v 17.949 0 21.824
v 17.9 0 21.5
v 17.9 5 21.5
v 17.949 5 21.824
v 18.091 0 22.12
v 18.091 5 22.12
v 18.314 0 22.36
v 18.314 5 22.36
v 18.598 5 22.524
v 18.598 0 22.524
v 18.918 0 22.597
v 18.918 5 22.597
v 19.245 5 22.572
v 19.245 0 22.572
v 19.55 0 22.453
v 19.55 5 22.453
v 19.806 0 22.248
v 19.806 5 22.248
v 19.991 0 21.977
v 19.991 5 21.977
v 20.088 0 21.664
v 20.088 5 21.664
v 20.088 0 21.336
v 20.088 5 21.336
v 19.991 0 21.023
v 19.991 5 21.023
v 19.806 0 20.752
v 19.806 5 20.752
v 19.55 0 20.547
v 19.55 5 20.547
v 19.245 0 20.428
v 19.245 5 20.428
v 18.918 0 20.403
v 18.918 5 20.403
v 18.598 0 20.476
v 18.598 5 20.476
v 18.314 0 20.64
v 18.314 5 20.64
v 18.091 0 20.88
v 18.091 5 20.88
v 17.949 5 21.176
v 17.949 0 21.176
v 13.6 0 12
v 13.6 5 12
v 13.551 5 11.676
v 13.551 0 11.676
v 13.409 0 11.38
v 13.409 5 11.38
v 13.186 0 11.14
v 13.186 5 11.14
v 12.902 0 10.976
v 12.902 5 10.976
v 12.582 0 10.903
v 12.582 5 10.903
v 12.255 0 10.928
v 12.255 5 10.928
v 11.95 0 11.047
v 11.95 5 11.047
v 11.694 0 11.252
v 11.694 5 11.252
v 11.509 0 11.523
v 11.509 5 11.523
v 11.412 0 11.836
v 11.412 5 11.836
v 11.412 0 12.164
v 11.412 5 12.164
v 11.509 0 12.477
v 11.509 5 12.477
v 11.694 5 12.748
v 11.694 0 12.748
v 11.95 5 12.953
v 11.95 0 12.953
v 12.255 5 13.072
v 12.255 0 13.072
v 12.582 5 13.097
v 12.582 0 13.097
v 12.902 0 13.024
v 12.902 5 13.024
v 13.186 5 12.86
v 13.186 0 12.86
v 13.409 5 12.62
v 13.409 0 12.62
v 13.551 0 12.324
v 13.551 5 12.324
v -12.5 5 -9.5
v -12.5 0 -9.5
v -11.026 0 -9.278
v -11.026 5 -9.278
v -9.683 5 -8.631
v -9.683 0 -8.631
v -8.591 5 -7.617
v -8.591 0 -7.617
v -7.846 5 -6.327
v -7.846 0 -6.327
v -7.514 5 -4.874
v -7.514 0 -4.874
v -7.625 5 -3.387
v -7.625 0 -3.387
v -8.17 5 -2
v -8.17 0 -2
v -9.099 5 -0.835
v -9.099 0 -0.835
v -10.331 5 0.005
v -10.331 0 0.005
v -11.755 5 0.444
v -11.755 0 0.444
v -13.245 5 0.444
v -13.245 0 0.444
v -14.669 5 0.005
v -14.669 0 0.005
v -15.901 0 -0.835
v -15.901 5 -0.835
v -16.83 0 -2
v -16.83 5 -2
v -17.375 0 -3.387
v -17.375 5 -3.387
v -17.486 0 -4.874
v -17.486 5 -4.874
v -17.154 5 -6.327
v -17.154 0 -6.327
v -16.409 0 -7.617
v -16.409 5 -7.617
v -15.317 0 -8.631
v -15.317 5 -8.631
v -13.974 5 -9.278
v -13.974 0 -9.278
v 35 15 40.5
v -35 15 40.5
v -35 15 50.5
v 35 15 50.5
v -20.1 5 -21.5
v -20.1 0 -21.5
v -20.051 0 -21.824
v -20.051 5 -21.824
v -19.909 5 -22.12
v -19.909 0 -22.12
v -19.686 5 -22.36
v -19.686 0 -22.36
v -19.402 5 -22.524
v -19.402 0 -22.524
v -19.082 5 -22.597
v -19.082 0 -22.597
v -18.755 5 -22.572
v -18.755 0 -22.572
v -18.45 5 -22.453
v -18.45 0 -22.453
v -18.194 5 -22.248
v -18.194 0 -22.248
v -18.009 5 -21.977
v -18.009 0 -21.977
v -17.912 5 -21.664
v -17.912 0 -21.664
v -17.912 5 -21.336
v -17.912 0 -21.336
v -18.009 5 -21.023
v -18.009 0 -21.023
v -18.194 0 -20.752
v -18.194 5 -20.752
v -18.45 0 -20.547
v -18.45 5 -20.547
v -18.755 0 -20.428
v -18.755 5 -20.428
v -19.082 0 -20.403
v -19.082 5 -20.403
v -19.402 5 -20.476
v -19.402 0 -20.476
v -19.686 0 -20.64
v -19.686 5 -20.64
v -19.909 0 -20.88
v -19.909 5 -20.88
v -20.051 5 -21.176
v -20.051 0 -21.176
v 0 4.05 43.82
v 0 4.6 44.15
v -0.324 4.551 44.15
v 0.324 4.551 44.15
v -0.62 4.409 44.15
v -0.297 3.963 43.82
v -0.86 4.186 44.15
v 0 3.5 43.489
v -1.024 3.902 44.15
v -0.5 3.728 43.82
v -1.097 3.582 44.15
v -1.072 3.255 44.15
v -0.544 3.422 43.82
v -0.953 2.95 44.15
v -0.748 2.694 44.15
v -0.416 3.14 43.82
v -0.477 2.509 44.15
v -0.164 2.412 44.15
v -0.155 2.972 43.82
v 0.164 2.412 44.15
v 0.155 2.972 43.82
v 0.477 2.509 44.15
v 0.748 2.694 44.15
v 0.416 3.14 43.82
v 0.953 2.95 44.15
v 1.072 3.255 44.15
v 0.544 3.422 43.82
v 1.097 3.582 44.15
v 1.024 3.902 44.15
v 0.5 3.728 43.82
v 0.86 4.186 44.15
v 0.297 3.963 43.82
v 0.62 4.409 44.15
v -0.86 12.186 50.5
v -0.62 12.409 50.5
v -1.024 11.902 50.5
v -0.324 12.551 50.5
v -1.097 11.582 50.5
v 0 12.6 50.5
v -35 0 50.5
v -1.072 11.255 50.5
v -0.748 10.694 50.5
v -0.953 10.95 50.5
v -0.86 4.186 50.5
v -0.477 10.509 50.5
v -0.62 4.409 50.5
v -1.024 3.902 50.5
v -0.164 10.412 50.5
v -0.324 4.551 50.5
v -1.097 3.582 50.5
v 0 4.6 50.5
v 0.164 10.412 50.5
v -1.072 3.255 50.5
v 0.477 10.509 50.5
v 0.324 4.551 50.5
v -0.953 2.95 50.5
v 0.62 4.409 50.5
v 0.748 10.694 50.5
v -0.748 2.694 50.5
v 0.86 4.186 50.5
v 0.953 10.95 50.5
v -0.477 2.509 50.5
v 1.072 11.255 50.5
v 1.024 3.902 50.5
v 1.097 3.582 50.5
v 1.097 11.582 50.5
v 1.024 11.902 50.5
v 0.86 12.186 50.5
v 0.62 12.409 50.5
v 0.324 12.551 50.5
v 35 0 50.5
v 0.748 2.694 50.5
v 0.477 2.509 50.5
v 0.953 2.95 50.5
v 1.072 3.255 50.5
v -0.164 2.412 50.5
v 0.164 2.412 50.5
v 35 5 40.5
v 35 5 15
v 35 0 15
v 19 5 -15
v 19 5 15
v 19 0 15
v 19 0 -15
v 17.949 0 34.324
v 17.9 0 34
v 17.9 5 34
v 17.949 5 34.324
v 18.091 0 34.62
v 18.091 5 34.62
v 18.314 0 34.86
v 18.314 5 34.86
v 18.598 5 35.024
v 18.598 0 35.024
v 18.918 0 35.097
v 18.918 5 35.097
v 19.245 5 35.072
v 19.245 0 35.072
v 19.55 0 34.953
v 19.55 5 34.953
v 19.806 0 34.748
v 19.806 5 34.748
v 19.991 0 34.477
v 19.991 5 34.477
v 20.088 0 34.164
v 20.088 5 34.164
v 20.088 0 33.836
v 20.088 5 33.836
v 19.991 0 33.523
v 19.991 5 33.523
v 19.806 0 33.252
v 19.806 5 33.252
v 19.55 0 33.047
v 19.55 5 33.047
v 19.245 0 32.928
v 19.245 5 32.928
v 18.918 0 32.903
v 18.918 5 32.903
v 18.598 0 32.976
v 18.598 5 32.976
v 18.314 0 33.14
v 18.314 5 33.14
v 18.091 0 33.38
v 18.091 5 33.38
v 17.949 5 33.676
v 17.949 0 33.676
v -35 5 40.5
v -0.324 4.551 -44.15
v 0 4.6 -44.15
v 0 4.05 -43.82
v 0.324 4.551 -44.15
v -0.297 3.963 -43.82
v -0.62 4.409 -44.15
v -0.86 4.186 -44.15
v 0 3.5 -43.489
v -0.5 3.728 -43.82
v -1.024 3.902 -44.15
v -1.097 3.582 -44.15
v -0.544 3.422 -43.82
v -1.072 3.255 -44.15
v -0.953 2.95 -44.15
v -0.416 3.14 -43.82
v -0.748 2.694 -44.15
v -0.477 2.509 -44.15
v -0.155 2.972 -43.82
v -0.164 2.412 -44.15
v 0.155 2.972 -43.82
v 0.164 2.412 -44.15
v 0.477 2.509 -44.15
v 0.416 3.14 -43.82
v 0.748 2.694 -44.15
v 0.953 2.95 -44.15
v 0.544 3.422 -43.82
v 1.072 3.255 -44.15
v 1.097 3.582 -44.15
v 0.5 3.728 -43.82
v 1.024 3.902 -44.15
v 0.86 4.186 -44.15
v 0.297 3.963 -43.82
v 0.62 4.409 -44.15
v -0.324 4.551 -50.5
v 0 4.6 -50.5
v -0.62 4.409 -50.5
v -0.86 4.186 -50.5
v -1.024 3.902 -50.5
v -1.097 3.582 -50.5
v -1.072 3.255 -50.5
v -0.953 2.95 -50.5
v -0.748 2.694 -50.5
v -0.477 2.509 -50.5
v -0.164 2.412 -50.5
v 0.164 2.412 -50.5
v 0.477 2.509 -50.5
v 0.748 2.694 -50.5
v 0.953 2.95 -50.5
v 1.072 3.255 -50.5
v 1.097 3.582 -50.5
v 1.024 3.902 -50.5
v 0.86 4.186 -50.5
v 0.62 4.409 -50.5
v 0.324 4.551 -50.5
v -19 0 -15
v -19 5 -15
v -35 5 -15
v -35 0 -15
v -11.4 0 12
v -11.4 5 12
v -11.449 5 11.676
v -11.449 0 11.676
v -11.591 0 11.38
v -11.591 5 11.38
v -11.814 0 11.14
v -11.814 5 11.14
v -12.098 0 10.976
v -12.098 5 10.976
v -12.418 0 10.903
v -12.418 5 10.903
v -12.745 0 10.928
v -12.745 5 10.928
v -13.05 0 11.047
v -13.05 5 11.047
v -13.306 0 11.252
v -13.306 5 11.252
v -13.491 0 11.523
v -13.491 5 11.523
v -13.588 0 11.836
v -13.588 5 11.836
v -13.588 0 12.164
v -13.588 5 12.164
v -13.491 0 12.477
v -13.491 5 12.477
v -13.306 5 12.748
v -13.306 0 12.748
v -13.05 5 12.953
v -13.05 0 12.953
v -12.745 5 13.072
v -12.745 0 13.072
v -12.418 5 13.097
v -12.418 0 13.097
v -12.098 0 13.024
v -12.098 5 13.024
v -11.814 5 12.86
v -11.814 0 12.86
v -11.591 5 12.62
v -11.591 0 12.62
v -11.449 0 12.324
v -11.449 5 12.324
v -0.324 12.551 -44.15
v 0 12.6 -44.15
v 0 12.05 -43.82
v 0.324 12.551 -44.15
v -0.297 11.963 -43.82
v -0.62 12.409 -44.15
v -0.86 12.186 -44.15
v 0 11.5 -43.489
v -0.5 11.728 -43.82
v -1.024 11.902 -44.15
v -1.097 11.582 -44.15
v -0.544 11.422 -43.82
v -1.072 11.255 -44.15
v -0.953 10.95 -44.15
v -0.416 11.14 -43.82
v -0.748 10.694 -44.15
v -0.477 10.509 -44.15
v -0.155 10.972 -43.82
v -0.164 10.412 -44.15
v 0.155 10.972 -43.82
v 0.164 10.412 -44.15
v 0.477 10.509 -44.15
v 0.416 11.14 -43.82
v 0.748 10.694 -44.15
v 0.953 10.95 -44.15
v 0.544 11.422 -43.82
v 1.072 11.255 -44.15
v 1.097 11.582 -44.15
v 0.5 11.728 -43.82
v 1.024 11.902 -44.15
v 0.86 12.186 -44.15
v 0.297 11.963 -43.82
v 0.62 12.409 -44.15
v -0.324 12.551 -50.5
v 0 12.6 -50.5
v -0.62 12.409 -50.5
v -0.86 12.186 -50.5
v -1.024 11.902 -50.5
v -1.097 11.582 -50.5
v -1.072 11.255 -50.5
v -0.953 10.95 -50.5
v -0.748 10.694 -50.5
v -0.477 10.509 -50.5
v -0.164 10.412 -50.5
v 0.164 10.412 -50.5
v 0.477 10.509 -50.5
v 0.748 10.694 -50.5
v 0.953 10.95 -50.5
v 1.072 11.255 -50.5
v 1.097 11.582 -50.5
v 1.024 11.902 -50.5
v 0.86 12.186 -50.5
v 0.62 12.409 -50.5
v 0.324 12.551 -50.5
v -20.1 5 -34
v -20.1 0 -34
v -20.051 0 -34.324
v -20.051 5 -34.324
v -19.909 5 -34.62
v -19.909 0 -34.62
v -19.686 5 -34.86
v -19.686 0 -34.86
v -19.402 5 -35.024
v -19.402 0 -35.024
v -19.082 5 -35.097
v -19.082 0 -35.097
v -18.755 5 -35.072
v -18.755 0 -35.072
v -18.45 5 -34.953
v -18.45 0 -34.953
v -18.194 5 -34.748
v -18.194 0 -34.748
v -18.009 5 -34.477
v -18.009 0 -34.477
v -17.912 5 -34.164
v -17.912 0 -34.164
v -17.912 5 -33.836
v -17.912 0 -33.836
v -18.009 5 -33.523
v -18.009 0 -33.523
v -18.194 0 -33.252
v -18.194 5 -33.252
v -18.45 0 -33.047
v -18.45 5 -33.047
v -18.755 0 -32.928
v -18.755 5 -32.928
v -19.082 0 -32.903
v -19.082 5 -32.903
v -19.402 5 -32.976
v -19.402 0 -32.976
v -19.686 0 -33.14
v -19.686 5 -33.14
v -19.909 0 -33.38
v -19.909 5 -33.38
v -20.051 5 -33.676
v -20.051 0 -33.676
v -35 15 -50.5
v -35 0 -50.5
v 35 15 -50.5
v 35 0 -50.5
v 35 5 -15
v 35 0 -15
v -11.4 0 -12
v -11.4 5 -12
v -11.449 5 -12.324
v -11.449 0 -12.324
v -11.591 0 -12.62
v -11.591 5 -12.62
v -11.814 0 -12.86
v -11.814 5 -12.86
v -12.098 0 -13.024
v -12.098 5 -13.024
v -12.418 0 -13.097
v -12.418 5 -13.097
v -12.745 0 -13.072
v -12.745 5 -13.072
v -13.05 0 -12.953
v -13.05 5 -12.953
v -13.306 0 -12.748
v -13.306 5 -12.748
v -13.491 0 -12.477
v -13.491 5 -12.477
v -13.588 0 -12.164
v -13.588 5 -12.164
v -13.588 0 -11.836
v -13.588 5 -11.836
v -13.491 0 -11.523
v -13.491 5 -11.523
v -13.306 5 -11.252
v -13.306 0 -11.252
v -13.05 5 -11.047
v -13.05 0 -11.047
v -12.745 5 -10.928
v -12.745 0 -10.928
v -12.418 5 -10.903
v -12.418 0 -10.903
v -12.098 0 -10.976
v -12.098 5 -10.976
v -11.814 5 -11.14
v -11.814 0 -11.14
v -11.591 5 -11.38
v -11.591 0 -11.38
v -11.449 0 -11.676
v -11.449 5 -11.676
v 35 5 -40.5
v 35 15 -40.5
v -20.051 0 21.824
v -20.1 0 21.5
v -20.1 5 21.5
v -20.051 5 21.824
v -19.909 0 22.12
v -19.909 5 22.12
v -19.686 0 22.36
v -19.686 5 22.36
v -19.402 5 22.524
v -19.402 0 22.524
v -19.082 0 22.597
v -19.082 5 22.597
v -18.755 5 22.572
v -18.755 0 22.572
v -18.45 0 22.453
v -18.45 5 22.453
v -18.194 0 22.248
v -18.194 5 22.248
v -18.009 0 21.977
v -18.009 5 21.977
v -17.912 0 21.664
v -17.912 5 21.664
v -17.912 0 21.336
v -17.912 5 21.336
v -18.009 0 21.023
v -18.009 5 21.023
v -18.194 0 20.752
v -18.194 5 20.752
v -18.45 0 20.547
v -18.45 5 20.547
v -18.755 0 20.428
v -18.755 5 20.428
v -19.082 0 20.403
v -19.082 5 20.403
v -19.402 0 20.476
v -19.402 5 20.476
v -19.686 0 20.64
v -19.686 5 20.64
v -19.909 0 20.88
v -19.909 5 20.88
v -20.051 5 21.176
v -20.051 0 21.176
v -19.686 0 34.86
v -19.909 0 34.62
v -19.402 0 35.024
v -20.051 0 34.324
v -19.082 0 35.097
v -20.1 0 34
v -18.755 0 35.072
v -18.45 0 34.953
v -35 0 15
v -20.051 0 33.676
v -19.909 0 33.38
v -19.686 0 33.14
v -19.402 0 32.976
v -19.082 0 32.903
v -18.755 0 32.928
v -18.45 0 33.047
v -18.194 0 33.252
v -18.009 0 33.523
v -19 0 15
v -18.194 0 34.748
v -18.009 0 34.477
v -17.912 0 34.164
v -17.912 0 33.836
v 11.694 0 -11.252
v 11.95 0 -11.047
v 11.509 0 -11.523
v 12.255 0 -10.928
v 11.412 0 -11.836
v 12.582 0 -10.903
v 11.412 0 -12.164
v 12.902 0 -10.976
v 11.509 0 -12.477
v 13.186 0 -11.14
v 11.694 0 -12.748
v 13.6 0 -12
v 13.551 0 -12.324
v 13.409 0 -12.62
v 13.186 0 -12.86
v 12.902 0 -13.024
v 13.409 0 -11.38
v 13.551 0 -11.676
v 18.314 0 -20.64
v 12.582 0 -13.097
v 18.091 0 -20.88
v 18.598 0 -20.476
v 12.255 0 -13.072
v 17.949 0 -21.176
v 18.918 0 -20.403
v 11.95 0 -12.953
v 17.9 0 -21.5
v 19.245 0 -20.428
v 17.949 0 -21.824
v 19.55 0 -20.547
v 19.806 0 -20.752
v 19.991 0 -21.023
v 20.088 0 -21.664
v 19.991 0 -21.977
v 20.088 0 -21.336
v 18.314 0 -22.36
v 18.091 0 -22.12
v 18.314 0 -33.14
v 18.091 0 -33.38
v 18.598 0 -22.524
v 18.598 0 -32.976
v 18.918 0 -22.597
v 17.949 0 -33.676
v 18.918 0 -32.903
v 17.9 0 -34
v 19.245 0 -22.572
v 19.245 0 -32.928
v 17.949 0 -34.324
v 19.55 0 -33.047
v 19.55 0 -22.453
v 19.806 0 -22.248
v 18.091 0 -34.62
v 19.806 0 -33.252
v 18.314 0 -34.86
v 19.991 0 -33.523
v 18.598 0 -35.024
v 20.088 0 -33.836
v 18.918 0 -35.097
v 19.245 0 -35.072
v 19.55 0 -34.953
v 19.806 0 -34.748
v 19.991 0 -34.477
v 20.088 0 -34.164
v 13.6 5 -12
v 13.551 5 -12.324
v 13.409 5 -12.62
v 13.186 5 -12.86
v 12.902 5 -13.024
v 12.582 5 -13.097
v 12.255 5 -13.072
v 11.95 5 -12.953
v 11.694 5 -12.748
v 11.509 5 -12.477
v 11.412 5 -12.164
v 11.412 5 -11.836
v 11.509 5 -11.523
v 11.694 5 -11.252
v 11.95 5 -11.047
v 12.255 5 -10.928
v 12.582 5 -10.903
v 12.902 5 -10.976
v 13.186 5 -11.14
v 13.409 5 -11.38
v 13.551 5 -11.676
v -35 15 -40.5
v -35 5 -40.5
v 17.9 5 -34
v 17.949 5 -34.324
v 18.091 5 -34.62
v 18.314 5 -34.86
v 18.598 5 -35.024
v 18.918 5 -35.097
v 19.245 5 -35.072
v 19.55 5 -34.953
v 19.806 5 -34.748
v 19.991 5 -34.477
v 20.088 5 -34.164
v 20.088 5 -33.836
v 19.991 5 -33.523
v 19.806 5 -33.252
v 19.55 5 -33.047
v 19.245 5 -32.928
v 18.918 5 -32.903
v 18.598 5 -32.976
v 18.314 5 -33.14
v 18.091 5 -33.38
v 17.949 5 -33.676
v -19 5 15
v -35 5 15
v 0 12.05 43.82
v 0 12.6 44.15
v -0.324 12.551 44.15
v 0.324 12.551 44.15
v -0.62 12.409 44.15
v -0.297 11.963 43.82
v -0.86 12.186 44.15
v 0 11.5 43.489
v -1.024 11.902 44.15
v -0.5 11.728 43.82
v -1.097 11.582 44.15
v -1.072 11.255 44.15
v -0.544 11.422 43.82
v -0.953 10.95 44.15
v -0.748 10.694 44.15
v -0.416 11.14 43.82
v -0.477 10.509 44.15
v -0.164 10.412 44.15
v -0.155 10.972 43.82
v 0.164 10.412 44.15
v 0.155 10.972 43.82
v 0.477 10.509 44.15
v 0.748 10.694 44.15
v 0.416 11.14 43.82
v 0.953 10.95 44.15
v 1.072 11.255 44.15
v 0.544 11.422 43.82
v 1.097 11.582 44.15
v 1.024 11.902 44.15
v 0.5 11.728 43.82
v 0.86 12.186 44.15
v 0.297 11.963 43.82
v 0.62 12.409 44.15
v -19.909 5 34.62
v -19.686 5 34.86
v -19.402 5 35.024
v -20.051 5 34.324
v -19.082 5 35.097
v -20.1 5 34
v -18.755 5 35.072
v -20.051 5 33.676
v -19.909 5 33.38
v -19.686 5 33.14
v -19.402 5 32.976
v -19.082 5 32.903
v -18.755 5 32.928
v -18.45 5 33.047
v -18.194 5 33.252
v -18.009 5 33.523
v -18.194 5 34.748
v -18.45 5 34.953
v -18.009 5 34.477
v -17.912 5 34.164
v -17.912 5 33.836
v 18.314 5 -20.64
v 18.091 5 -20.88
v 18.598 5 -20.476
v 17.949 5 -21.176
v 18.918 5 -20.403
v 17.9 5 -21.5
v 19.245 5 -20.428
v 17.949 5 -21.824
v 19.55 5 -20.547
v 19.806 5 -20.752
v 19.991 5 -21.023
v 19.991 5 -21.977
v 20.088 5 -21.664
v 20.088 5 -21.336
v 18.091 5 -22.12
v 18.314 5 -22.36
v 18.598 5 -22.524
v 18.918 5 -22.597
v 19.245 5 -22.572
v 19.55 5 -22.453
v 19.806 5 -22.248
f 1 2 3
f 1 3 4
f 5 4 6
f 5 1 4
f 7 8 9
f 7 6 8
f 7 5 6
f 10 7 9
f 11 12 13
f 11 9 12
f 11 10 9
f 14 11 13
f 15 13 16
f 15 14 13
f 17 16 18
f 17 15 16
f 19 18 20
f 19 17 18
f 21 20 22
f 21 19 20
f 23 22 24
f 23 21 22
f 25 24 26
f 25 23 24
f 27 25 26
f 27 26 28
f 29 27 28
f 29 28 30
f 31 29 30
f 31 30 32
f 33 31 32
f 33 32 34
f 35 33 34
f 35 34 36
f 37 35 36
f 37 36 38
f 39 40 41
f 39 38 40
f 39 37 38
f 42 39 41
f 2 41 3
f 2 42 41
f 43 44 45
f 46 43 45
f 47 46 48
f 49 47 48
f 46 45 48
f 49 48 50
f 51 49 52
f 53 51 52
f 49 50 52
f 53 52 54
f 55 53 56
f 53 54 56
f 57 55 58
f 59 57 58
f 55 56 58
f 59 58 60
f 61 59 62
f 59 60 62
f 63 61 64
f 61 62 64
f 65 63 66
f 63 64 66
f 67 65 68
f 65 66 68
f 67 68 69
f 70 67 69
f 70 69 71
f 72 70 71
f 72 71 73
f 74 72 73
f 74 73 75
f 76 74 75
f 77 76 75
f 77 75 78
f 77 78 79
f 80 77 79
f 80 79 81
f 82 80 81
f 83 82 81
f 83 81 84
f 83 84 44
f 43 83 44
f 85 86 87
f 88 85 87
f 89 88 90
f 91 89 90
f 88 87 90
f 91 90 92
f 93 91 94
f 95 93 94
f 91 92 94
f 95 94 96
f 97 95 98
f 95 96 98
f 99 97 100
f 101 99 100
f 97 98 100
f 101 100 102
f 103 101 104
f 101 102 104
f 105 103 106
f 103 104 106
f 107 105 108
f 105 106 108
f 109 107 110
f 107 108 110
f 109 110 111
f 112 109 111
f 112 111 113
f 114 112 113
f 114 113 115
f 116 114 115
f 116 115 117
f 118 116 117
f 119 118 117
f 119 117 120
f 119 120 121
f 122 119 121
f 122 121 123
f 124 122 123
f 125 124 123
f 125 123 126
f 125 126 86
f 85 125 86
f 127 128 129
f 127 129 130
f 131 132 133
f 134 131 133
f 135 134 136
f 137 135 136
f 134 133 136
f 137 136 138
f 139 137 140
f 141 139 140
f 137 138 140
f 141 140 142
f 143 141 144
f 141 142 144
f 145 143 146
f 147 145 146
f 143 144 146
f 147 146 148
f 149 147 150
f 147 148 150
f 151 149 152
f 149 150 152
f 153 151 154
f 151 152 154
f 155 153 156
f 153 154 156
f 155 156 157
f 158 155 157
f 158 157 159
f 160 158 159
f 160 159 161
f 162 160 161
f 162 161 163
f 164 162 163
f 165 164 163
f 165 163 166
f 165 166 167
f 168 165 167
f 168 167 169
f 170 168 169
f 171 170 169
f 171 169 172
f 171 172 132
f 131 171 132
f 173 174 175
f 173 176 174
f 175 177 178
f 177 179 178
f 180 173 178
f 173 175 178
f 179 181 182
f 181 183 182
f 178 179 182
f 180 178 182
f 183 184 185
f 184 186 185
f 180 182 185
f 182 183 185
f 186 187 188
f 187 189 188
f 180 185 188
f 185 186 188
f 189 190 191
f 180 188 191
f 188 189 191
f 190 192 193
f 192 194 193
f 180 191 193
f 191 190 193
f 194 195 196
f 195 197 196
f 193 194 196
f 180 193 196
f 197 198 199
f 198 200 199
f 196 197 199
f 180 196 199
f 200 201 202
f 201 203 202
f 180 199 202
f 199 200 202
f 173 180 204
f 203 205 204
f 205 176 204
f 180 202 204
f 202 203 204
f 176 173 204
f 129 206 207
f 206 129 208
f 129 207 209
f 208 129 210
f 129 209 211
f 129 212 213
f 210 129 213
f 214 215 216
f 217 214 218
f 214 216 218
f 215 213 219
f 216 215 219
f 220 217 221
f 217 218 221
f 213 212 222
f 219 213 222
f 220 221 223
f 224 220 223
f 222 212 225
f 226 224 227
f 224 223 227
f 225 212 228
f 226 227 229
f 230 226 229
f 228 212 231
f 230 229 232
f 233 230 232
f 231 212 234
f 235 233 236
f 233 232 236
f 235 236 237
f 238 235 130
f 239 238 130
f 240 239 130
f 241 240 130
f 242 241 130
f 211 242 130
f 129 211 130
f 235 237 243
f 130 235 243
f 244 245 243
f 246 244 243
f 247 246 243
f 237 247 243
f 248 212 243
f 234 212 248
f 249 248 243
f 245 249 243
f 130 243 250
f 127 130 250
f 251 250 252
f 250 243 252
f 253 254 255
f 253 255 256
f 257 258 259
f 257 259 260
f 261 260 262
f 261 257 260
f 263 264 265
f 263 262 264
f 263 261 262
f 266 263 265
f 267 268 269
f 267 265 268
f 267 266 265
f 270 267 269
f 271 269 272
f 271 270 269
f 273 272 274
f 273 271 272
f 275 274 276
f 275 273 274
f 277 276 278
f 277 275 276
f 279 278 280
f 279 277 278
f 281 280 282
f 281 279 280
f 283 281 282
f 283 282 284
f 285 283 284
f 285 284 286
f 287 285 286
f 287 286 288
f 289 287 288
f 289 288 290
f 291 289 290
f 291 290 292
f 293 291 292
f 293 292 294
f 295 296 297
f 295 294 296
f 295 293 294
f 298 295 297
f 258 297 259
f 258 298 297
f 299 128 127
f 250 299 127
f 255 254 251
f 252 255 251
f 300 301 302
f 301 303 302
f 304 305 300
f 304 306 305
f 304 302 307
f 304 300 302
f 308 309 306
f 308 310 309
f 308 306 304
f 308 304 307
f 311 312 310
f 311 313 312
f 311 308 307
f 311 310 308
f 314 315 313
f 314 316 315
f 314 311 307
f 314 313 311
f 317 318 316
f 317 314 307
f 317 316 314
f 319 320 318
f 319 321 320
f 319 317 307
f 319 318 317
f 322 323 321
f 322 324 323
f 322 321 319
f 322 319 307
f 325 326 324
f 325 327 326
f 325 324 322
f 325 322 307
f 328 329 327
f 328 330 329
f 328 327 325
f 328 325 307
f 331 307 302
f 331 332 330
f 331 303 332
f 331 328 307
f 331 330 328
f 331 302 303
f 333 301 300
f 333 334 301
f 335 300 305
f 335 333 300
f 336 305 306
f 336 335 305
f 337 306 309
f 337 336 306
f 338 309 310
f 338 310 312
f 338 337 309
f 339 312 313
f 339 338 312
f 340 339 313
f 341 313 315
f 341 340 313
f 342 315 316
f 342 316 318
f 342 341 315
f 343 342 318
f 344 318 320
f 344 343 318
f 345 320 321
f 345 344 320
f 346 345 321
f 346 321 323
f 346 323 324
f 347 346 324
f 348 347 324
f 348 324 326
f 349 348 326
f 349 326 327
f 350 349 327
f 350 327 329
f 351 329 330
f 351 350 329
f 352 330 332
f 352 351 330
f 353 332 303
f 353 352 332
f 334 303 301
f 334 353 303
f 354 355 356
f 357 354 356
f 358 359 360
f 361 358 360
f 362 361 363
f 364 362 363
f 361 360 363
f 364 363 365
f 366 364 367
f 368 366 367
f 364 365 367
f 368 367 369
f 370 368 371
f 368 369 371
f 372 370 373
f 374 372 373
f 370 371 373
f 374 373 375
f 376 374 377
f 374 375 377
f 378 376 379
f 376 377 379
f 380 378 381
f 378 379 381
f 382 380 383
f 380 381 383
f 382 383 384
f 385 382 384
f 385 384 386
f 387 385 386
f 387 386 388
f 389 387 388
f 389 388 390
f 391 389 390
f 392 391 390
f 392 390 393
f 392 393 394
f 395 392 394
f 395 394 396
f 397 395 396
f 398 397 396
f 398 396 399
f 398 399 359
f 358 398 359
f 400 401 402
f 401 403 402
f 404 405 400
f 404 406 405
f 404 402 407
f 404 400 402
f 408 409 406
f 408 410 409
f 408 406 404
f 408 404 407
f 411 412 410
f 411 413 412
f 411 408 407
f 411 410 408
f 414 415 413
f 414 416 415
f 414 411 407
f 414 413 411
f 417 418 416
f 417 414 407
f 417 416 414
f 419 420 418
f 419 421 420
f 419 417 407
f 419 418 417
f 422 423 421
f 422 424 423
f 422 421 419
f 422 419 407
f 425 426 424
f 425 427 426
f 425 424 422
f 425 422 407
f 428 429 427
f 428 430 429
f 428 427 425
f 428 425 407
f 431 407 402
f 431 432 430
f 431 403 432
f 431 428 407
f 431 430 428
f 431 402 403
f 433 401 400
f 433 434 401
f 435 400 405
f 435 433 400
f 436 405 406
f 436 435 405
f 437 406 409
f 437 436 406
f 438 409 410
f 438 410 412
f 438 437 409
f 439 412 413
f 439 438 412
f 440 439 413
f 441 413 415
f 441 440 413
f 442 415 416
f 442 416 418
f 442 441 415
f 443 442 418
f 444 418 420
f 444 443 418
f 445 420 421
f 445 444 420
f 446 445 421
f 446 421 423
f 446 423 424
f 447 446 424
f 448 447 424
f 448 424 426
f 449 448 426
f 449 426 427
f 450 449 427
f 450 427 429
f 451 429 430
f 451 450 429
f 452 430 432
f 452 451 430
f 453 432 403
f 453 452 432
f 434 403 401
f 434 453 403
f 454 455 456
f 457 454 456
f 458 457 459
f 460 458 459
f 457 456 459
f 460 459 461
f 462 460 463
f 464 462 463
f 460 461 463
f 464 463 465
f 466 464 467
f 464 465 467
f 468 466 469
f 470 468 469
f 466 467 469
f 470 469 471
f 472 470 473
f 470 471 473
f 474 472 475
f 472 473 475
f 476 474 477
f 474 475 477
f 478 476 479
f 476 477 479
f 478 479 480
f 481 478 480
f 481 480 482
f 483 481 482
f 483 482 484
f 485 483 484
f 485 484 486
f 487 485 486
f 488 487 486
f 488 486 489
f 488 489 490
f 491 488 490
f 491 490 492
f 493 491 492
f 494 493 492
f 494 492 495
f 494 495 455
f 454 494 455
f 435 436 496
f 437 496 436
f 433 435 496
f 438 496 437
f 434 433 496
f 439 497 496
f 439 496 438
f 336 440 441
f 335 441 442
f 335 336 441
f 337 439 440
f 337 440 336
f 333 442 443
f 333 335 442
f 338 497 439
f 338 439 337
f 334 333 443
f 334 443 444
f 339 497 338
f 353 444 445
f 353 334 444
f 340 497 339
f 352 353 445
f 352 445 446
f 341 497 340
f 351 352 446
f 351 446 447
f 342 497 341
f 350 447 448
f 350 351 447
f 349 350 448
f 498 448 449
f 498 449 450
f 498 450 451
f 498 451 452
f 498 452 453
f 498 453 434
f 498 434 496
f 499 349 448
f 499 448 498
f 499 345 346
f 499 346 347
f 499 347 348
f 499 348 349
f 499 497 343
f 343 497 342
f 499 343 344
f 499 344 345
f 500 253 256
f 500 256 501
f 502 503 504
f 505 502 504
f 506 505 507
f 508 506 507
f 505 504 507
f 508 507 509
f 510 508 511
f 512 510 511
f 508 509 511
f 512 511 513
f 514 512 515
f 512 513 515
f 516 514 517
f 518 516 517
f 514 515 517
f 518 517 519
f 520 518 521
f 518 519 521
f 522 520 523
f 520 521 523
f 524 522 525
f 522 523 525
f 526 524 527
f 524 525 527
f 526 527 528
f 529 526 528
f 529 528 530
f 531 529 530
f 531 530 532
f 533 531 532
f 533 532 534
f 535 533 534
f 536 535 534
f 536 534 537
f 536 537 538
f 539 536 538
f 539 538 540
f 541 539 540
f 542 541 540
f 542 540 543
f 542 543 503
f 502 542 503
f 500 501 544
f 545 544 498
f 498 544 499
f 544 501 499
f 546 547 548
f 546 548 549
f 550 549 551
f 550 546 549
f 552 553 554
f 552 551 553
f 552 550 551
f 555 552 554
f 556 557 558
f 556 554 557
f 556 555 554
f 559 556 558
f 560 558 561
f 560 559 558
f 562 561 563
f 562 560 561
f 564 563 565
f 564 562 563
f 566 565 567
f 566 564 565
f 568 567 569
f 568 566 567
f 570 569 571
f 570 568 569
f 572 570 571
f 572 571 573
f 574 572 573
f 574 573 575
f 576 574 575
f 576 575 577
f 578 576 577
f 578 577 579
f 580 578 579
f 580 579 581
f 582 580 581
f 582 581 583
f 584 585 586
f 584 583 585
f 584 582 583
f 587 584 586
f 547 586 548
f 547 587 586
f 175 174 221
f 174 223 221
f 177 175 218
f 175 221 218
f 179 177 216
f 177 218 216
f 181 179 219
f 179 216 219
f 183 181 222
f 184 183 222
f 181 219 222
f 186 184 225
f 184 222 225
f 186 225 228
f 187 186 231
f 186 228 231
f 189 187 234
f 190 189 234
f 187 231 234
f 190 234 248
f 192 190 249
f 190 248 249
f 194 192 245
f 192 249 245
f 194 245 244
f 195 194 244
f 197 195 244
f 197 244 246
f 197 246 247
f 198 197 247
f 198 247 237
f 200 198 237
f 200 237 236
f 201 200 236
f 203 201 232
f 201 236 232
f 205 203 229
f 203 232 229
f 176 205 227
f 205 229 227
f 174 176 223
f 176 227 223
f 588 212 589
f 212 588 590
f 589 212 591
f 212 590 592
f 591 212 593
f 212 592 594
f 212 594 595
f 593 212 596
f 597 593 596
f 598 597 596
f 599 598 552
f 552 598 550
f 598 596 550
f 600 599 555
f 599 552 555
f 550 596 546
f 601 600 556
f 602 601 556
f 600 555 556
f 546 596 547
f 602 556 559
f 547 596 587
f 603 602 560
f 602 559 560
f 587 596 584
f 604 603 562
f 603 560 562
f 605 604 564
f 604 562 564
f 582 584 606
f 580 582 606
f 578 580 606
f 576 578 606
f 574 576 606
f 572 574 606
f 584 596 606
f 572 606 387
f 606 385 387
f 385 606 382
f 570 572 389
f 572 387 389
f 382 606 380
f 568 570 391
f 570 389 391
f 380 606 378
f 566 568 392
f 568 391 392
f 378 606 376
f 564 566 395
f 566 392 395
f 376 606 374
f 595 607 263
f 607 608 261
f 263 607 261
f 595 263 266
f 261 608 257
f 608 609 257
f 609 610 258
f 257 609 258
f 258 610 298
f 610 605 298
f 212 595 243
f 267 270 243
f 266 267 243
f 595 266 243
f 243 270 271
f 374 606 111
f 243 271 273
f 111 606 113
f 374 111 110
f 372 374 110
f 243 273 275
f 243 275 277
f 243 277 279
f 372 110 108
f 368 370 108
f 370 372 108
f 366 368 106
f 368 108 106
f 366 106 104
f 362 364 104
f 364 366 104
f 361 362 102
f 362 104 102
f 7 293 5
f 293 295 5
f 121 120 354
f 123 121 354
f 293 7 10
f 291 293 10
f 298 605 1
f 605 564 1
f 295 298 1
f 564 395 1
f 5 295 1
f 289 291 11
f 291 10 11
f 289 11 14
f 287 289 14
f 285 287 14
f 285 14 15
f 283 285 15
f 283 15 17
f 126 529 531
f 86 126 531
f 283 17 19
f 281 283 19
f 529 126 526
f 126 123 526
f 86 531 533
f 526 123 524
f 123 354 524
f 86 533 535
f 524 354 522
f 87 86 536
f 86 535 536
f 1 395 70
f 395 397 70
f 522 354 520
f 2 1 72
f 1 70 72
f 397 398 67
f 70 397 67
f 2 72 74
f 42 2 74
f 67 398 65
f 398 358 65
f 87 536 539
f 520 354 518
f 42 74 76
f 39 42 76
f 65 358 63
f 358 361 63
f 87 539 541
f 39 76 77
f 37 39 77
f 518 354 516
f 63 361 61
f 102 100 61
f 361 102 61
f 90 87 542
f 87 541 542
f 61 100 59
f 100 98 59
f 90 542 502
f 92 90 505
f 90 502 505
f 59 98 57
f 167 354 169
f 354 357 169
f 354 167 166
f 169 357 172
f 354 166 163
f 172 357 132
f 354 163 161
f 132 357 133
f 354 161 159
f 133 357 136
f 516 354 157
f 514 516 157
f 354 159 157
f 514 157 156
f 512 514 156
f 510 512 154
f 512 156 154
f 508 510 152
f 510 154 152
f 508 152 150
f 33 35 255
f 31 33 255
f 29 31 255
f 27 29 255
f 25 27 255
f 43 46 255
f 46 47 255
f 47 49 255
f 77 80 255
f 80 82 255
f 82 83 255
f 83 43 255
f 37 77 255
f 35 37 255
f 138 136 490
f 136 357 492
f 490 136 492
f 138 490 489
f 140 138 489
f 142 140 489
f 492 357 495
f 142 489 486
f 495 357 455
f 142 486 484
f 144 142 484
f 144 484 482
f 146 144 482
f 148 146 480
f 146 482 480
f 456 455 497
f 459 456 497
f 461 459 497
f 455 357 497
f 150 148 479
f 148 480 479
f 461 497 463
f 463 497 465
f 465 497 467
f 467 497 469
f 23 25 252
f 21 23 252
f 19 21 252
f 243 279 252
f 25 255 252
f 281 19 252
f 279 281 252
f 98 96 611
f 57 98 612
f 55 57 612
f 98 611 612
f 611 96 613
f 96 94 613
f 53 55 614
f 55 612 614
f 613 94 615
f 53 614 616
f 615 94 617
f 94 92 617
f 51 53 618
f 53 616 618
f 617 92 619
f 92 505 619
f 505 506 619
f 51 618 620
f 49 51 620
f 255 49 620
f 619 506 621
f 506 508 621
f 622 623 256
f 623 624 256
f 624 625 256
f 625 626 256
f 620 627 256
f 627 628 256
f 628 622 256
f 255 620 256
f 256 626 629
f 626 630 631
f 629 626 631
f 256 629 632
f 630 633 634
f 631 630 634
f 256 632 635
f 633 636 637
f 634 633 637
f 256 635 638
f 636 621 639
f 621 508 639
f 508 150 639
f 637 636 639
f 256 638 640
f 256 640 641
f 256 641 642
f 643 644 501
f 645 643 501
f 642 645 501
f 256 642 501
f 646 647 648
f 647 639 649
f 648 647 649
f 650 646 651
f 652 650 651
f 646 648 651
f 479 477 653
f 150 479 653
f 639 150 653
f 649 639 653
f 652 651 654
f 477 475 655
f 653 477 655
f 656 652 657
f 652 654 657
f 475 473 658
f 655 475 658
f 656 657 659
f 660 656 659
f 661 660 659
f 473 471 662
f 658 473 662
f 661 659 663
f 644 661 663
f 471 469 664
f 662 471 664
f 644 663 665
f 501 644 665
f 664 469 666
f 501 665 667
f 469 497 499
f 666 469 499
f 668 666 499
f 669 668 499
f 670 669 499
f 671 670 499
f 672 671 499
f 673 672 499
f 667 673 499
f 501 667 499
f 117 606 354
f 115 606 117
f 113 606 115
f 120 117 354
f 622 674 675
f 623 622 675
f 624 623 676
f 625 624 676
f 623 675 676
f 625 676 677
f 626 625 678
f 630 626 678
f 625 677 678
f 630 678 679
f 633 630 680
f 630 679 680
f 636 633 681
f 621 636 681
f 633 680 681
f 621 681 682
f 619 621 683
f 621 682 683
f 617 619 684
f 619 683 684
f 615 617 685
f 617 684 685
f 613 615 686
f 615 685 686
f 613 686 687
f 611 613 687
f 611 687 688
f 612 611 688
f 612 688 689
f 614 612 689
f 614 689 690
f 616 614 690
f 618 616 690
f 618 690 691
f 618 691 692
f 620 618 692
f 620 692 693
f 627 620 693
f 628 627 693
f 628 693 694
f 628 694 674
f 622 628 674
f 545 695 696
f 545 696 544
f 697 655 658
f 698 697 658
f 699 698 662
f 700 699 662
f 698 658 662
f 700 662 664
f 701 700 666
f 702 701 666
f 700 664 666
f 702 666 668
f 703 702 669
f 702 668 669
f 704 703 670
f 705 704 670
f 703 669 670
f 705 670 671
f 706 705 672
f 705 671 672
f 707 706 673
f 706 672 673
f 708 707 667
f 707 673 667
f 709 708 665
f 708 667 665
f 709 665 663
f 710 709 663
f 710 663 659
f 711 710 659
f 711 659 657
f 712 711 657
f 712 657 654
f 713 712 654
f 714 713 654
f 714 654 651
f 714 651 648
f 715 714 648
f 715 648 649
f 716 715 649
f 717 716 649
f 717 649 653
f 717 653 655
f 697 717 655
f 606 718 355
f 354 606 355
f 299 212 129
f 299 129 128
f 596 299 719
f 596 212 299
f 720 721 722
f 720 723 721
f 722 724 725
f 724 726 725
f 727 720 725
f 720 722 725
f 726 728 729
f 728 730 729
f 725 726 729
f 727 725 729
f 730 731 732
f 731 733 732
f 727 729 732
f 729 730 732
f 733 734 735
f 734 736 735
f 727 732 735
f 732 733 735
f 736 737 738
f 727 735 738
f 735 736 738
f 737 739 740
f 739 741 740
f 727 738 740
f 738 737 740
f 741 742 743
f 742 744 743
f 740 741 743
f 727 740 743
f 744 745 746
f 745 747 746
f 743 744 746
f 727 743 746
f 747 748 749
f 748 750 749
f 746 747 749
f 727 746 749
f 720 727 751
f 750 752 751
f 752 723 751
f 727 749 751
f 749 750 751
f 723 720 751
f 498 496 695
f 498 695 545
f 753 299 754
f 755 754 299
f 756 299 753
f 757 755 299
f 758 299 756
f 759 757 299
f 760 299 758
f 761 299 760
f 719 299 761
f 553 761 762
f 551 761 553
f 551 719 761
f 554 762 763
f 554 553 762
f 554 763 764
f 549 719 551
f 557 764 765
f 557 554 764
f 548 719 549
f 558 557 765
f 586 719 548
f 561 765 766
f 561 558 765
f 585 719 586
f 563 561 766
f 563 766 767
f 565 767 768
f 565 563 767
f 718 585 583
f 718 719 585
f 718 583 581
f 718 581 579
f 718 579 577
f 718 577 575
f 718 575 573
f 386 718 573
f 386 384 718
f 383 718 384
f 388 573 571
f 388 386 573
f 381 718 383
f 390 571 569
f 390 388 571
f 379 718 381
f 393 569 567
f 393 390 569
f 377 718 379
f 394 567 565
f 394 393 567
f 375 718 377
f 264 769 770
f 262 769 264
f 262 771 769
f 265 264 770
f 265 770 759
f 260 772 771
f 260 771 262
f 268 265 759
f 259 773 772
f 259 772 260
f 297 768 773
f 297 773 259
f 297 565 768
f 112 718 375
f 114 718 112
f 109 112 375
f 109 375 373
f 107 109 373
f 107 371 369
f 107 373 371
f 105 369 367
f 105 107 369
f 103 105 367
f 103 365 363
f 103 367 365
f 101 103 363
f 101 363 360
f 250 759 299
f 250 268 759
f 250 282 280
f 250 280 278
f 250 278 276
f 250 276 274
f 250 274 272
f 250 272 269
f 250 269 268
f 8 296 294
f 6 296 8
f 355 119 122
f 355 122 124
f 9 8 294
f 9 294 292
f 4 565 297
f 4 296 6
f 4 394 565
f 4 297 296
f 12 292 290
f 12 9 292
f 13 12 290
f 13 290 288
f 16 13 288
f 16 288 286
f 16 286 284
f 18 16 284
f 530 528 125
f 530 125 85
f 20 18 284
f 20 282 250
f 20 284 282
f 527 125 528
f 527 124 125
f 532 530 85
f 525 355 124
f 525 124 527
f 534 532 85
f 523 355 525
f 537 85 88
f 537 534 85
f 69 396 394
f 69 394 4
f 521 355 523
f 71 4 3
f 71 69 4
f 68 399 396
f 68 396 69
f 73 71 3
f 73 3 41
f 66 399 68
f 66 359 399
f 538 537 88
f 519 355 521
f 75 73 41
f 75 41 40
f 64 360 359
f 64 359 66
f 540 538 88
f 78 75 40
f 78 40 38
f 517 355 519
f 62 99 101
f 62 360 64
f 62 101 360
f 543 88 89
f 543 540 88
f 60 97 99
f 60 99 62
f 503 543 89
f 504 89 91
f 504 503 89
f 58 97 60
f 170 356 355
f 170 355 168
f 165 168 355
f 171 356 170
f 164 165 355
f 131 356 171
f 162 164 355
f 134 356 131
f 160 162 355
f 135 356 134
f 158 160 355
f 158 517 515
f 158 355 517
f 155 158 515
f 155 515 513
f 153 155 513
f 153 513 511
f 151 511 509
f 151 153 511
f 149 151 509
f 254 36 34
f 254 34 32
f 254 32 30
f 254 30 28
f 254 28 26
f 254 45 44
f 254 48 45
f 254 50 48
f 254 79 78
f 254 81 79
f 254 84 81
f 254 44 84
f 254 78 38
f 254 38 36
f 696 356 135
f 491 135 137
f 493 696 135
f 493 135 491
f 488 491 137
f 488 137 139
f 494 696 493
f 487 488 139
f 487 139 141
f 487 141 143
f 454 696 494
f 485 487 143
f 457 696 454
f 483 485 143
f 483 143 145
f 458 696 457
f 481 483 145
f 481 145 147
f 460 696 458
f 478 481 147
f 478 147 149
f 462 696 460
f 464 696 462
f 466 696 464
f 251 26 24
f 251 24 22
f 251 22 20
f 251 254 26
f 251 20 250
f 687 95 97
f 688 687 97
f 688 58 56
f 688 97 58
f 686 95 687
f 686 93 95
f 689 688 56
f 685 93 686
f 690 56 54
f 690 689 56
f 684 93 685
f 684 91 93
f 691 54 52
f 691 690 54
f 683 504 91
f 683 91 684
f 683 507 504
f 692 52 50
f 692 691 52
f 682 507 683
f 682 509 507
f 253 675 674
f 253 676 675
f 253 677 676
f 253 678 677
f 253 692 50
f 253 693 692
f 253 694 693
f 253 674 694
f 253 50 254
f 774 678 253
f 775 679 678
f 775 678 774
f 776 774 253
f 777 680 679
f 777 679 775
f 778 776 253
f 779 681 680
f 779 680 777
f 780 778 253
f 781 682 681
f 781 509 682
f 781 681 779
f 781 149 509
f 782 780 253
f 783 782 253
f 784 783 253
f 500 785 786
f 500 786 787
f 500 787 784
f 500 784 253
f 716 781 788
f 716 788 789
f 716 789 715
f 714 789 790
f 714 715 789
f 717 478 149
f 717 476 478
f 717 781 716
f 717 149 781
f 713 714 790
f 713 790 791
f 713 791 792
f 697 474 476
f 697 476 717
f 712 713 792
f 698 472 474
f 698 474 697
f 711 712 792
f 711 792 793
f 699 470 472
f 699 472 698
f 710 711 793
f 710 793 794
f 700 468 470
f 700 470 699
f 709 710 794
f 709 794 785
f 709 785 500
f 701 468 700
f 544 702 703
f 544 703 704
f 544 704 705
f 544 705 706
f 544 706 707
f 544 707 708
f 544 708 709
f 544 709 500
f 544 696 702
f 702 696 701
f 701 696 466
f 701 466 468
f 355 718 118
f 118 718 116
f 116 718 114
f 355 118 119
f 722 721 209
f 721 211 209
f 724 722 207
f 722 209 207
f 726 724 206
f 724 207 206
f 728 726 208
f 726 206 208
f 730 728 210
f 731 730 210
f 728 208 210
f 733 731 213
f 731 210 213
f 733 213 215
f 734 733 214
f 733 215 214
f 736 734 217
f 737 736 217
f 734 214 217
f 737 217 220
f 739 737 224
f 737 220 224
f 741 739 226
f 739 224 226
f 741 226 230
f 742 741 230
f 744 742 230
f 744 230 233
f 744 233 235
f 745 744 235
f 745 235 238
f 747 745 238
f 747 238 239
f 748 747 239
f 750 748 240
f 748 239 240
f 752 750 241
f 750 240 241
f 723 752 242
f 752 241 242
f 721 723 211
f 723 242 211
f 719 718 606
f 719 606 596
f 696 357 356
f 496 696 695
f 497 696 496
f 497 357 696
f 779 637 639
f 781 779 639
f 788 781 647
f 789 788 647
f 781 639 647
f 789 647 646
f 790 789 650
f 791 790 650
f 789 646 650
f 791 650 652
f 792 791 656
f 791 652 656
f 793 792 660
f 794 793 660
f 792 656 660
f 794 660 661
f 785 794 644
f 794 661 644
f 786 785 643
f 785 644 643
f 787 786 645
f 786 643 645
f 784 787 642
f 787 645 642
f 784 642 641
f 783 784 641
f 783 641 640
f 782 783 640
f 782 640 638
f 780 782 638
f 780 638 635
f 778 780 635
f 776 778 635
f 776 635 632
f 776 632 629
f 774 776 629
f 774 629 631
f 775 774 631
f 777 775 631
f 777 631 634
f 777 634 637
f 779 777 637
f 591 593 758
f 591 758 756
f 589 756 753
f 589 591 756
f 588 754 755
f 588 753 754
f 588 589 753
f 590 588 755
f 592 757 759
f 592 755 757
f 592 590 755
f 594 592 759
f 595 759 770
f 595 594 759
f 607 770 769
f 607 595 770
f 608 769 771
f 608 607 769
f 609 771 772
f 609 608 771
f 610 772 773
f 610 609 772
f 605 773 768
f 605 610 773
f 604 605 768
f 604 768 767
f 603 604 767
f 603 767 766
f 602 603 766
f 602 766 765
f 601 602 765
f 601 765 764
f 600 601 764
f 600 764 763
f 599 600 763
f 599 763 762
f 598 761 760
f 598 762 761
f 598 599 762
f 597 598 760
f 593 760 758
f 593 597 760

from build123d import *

# Parameters (mm, degrees)
SKETCH_1_W           = 70
SKETCH_1_H           = 101
EXTRUDE_1_DEPTH      = 15
SKETCH_3_W           = 70
SKETCH_3_H           = 81
CUT_EXTRUDE_2_DEPTH  = 10
F_1_0MM_1_AT_2_COUNT = 2
F_1_0MM_1_AT_2_PITCH = 8
SKETCH_7_W           = 16
SKETCH_7_H           = 30
CUT_EXTRUDE_3_DEPTH  = 63.251506006
F_1_0MM_3_D          = 2.2
SKETCH_11_R          = 5
CUT_EXTRUDE_4_DEPTH  = 64.247529596
F_1_0MM_2_D          = 2.2


with BuildPart() as part:
    # 草圖1 → 填料-伸長1 (new body)
    with BuildSketch(Plane(origin=(0, 0, 0), x_dir=(1, 0, 0), z_dir=(0, 1, 0))):
        Rectangle(SKETCH_1_W, SKETCH_1_H)
    extrude(amount=EXTRUDE_1_DEPTH)

    # 草圖3 → 除料-伸長2 (cut)
    with BuildSketch(Plane(origin=(0, 15, 0), x_dir=(1, 0, 0), z_dir=(0, 1, 0))):
        Rectangle(SKETCH_3_W, SKETCH_3_H)
    extrude(amount=-CUT_EXTRUDE_2_DEPTH, mode=Mode.SUBTRACT)

    # 草圖6 → Ø1.0mm 定位孔1 (revolve, cut)
    with BuildSketch(Plane(origin=(0, 3.5, -50.5), x_dir=(0, 1, 0), z_dir=(1, 0, 0))):
        Polygon((0, 0), (0, 7.010946681), (1.1, 6.35), (1.1, 0), align=None)
    f_1_0mm_1 = revolve(axis=Axis((0, 3.5, -56.85), (0, 0, 1)), mode=Mode.SUBTRACT)

    # Ø1.0mm 定位孔1 at 2: Ø1.0mm 定位孔1 ×2
    with Locations(*[(0, i * F_1_0MM_1_AT_2_PITCH, 0) for i in range(1, F_1_0MM_1_AT_2_COUNT)]):
        add(f_1_0mm_1, mode=Mode.SUBTRACT)

    # 鏡射1: Ø1.0mm 定位孔1 across plane
    add(f_1_0mm_1.mirror(Plane.XY), mode=Mode.SUBTRACT)

    # 鏡射1 copy 1 sketch → 鏡射1 copy 1 (revolve, cut)
    with BuildSketch(Plane(origin=(0, 11.5, 50.5), x_dir=(0, 1, 0), z_dir=(1, 0, 0))):
        Polygon((0, 0), (0, -7.010946681), (1.1, -6.35), (1.1, 0), align=None)
    revolve(axis=Axis((0, 11.5, 56.85), (0, 0, 1)), mode=Mode.SUBTRACT)

    # 草圖7 → 除料-伸長3 (cut, through all)
    with BuildSketch(Plane(origin=(0, 5, 0), x_dir=(1, 0, 0), z_dir=(0, 1, 0))):
        with Locations((27, 0)):
            Rectangle(SKETCH_7_W, SKETCH_7_H)
    cut_extrude_3 = extrude(amount=-CUT_EXTRUDE_3_DEPTH, mode=Mode.SUBTRACT)

    # 鏡射2: 除料-伸長3 across plane
    add(cut_extrude_3.mirror(Plane(origin=(0, 0, 0), x_dir=(0, 0, 1), z_dir=(1, 0, 0))), mode=Mode.SUBTRACT)

    # Ø1.0mm 定位孔3 (through all)
    with Locations(Plane(origin=(0, 0, 0), x_dir=(-1, 0, 0), z_dir=(0, -1, 0))):
        with Locations((-12.5, -12), (12.5, -12), (-12.5, 12), (12.5, 12)):
            Hole(F_1_0MM_3_D / 2)

    # 草圖11 → 除料-伸長4 (cut, through all)
    with BuildSketch(Plane.XZ):
        with Locations(Location((-12.5, -4.5, 0), (0, 0, 270))):
            Circle(SKETCH_11_R)
    extrude(amount=-CUT_EXTRUDE_4_DEPTH, mode=Mode.SUBTRACT)

    # Ø1.0mm 定位孔2 (through all)
    with Locations(Plane(origin=(0, 5, 0), x_dir=(1, 0, 0), z_dir=(0, 1, 0))):
        with Locations((-19, 34), (-19, 21.5), (19, 21.5), (19, 34)):
            f_1_0mm_2 = Hole(F_1_0MM_2_D / 2)

    # 鏡射3: Ø1.0mm 定位孔2 across plane
    add(f_1_0mm_2.mirror(Plane.XY), mode=Mode.SUBTRACT)


solid = part.part
